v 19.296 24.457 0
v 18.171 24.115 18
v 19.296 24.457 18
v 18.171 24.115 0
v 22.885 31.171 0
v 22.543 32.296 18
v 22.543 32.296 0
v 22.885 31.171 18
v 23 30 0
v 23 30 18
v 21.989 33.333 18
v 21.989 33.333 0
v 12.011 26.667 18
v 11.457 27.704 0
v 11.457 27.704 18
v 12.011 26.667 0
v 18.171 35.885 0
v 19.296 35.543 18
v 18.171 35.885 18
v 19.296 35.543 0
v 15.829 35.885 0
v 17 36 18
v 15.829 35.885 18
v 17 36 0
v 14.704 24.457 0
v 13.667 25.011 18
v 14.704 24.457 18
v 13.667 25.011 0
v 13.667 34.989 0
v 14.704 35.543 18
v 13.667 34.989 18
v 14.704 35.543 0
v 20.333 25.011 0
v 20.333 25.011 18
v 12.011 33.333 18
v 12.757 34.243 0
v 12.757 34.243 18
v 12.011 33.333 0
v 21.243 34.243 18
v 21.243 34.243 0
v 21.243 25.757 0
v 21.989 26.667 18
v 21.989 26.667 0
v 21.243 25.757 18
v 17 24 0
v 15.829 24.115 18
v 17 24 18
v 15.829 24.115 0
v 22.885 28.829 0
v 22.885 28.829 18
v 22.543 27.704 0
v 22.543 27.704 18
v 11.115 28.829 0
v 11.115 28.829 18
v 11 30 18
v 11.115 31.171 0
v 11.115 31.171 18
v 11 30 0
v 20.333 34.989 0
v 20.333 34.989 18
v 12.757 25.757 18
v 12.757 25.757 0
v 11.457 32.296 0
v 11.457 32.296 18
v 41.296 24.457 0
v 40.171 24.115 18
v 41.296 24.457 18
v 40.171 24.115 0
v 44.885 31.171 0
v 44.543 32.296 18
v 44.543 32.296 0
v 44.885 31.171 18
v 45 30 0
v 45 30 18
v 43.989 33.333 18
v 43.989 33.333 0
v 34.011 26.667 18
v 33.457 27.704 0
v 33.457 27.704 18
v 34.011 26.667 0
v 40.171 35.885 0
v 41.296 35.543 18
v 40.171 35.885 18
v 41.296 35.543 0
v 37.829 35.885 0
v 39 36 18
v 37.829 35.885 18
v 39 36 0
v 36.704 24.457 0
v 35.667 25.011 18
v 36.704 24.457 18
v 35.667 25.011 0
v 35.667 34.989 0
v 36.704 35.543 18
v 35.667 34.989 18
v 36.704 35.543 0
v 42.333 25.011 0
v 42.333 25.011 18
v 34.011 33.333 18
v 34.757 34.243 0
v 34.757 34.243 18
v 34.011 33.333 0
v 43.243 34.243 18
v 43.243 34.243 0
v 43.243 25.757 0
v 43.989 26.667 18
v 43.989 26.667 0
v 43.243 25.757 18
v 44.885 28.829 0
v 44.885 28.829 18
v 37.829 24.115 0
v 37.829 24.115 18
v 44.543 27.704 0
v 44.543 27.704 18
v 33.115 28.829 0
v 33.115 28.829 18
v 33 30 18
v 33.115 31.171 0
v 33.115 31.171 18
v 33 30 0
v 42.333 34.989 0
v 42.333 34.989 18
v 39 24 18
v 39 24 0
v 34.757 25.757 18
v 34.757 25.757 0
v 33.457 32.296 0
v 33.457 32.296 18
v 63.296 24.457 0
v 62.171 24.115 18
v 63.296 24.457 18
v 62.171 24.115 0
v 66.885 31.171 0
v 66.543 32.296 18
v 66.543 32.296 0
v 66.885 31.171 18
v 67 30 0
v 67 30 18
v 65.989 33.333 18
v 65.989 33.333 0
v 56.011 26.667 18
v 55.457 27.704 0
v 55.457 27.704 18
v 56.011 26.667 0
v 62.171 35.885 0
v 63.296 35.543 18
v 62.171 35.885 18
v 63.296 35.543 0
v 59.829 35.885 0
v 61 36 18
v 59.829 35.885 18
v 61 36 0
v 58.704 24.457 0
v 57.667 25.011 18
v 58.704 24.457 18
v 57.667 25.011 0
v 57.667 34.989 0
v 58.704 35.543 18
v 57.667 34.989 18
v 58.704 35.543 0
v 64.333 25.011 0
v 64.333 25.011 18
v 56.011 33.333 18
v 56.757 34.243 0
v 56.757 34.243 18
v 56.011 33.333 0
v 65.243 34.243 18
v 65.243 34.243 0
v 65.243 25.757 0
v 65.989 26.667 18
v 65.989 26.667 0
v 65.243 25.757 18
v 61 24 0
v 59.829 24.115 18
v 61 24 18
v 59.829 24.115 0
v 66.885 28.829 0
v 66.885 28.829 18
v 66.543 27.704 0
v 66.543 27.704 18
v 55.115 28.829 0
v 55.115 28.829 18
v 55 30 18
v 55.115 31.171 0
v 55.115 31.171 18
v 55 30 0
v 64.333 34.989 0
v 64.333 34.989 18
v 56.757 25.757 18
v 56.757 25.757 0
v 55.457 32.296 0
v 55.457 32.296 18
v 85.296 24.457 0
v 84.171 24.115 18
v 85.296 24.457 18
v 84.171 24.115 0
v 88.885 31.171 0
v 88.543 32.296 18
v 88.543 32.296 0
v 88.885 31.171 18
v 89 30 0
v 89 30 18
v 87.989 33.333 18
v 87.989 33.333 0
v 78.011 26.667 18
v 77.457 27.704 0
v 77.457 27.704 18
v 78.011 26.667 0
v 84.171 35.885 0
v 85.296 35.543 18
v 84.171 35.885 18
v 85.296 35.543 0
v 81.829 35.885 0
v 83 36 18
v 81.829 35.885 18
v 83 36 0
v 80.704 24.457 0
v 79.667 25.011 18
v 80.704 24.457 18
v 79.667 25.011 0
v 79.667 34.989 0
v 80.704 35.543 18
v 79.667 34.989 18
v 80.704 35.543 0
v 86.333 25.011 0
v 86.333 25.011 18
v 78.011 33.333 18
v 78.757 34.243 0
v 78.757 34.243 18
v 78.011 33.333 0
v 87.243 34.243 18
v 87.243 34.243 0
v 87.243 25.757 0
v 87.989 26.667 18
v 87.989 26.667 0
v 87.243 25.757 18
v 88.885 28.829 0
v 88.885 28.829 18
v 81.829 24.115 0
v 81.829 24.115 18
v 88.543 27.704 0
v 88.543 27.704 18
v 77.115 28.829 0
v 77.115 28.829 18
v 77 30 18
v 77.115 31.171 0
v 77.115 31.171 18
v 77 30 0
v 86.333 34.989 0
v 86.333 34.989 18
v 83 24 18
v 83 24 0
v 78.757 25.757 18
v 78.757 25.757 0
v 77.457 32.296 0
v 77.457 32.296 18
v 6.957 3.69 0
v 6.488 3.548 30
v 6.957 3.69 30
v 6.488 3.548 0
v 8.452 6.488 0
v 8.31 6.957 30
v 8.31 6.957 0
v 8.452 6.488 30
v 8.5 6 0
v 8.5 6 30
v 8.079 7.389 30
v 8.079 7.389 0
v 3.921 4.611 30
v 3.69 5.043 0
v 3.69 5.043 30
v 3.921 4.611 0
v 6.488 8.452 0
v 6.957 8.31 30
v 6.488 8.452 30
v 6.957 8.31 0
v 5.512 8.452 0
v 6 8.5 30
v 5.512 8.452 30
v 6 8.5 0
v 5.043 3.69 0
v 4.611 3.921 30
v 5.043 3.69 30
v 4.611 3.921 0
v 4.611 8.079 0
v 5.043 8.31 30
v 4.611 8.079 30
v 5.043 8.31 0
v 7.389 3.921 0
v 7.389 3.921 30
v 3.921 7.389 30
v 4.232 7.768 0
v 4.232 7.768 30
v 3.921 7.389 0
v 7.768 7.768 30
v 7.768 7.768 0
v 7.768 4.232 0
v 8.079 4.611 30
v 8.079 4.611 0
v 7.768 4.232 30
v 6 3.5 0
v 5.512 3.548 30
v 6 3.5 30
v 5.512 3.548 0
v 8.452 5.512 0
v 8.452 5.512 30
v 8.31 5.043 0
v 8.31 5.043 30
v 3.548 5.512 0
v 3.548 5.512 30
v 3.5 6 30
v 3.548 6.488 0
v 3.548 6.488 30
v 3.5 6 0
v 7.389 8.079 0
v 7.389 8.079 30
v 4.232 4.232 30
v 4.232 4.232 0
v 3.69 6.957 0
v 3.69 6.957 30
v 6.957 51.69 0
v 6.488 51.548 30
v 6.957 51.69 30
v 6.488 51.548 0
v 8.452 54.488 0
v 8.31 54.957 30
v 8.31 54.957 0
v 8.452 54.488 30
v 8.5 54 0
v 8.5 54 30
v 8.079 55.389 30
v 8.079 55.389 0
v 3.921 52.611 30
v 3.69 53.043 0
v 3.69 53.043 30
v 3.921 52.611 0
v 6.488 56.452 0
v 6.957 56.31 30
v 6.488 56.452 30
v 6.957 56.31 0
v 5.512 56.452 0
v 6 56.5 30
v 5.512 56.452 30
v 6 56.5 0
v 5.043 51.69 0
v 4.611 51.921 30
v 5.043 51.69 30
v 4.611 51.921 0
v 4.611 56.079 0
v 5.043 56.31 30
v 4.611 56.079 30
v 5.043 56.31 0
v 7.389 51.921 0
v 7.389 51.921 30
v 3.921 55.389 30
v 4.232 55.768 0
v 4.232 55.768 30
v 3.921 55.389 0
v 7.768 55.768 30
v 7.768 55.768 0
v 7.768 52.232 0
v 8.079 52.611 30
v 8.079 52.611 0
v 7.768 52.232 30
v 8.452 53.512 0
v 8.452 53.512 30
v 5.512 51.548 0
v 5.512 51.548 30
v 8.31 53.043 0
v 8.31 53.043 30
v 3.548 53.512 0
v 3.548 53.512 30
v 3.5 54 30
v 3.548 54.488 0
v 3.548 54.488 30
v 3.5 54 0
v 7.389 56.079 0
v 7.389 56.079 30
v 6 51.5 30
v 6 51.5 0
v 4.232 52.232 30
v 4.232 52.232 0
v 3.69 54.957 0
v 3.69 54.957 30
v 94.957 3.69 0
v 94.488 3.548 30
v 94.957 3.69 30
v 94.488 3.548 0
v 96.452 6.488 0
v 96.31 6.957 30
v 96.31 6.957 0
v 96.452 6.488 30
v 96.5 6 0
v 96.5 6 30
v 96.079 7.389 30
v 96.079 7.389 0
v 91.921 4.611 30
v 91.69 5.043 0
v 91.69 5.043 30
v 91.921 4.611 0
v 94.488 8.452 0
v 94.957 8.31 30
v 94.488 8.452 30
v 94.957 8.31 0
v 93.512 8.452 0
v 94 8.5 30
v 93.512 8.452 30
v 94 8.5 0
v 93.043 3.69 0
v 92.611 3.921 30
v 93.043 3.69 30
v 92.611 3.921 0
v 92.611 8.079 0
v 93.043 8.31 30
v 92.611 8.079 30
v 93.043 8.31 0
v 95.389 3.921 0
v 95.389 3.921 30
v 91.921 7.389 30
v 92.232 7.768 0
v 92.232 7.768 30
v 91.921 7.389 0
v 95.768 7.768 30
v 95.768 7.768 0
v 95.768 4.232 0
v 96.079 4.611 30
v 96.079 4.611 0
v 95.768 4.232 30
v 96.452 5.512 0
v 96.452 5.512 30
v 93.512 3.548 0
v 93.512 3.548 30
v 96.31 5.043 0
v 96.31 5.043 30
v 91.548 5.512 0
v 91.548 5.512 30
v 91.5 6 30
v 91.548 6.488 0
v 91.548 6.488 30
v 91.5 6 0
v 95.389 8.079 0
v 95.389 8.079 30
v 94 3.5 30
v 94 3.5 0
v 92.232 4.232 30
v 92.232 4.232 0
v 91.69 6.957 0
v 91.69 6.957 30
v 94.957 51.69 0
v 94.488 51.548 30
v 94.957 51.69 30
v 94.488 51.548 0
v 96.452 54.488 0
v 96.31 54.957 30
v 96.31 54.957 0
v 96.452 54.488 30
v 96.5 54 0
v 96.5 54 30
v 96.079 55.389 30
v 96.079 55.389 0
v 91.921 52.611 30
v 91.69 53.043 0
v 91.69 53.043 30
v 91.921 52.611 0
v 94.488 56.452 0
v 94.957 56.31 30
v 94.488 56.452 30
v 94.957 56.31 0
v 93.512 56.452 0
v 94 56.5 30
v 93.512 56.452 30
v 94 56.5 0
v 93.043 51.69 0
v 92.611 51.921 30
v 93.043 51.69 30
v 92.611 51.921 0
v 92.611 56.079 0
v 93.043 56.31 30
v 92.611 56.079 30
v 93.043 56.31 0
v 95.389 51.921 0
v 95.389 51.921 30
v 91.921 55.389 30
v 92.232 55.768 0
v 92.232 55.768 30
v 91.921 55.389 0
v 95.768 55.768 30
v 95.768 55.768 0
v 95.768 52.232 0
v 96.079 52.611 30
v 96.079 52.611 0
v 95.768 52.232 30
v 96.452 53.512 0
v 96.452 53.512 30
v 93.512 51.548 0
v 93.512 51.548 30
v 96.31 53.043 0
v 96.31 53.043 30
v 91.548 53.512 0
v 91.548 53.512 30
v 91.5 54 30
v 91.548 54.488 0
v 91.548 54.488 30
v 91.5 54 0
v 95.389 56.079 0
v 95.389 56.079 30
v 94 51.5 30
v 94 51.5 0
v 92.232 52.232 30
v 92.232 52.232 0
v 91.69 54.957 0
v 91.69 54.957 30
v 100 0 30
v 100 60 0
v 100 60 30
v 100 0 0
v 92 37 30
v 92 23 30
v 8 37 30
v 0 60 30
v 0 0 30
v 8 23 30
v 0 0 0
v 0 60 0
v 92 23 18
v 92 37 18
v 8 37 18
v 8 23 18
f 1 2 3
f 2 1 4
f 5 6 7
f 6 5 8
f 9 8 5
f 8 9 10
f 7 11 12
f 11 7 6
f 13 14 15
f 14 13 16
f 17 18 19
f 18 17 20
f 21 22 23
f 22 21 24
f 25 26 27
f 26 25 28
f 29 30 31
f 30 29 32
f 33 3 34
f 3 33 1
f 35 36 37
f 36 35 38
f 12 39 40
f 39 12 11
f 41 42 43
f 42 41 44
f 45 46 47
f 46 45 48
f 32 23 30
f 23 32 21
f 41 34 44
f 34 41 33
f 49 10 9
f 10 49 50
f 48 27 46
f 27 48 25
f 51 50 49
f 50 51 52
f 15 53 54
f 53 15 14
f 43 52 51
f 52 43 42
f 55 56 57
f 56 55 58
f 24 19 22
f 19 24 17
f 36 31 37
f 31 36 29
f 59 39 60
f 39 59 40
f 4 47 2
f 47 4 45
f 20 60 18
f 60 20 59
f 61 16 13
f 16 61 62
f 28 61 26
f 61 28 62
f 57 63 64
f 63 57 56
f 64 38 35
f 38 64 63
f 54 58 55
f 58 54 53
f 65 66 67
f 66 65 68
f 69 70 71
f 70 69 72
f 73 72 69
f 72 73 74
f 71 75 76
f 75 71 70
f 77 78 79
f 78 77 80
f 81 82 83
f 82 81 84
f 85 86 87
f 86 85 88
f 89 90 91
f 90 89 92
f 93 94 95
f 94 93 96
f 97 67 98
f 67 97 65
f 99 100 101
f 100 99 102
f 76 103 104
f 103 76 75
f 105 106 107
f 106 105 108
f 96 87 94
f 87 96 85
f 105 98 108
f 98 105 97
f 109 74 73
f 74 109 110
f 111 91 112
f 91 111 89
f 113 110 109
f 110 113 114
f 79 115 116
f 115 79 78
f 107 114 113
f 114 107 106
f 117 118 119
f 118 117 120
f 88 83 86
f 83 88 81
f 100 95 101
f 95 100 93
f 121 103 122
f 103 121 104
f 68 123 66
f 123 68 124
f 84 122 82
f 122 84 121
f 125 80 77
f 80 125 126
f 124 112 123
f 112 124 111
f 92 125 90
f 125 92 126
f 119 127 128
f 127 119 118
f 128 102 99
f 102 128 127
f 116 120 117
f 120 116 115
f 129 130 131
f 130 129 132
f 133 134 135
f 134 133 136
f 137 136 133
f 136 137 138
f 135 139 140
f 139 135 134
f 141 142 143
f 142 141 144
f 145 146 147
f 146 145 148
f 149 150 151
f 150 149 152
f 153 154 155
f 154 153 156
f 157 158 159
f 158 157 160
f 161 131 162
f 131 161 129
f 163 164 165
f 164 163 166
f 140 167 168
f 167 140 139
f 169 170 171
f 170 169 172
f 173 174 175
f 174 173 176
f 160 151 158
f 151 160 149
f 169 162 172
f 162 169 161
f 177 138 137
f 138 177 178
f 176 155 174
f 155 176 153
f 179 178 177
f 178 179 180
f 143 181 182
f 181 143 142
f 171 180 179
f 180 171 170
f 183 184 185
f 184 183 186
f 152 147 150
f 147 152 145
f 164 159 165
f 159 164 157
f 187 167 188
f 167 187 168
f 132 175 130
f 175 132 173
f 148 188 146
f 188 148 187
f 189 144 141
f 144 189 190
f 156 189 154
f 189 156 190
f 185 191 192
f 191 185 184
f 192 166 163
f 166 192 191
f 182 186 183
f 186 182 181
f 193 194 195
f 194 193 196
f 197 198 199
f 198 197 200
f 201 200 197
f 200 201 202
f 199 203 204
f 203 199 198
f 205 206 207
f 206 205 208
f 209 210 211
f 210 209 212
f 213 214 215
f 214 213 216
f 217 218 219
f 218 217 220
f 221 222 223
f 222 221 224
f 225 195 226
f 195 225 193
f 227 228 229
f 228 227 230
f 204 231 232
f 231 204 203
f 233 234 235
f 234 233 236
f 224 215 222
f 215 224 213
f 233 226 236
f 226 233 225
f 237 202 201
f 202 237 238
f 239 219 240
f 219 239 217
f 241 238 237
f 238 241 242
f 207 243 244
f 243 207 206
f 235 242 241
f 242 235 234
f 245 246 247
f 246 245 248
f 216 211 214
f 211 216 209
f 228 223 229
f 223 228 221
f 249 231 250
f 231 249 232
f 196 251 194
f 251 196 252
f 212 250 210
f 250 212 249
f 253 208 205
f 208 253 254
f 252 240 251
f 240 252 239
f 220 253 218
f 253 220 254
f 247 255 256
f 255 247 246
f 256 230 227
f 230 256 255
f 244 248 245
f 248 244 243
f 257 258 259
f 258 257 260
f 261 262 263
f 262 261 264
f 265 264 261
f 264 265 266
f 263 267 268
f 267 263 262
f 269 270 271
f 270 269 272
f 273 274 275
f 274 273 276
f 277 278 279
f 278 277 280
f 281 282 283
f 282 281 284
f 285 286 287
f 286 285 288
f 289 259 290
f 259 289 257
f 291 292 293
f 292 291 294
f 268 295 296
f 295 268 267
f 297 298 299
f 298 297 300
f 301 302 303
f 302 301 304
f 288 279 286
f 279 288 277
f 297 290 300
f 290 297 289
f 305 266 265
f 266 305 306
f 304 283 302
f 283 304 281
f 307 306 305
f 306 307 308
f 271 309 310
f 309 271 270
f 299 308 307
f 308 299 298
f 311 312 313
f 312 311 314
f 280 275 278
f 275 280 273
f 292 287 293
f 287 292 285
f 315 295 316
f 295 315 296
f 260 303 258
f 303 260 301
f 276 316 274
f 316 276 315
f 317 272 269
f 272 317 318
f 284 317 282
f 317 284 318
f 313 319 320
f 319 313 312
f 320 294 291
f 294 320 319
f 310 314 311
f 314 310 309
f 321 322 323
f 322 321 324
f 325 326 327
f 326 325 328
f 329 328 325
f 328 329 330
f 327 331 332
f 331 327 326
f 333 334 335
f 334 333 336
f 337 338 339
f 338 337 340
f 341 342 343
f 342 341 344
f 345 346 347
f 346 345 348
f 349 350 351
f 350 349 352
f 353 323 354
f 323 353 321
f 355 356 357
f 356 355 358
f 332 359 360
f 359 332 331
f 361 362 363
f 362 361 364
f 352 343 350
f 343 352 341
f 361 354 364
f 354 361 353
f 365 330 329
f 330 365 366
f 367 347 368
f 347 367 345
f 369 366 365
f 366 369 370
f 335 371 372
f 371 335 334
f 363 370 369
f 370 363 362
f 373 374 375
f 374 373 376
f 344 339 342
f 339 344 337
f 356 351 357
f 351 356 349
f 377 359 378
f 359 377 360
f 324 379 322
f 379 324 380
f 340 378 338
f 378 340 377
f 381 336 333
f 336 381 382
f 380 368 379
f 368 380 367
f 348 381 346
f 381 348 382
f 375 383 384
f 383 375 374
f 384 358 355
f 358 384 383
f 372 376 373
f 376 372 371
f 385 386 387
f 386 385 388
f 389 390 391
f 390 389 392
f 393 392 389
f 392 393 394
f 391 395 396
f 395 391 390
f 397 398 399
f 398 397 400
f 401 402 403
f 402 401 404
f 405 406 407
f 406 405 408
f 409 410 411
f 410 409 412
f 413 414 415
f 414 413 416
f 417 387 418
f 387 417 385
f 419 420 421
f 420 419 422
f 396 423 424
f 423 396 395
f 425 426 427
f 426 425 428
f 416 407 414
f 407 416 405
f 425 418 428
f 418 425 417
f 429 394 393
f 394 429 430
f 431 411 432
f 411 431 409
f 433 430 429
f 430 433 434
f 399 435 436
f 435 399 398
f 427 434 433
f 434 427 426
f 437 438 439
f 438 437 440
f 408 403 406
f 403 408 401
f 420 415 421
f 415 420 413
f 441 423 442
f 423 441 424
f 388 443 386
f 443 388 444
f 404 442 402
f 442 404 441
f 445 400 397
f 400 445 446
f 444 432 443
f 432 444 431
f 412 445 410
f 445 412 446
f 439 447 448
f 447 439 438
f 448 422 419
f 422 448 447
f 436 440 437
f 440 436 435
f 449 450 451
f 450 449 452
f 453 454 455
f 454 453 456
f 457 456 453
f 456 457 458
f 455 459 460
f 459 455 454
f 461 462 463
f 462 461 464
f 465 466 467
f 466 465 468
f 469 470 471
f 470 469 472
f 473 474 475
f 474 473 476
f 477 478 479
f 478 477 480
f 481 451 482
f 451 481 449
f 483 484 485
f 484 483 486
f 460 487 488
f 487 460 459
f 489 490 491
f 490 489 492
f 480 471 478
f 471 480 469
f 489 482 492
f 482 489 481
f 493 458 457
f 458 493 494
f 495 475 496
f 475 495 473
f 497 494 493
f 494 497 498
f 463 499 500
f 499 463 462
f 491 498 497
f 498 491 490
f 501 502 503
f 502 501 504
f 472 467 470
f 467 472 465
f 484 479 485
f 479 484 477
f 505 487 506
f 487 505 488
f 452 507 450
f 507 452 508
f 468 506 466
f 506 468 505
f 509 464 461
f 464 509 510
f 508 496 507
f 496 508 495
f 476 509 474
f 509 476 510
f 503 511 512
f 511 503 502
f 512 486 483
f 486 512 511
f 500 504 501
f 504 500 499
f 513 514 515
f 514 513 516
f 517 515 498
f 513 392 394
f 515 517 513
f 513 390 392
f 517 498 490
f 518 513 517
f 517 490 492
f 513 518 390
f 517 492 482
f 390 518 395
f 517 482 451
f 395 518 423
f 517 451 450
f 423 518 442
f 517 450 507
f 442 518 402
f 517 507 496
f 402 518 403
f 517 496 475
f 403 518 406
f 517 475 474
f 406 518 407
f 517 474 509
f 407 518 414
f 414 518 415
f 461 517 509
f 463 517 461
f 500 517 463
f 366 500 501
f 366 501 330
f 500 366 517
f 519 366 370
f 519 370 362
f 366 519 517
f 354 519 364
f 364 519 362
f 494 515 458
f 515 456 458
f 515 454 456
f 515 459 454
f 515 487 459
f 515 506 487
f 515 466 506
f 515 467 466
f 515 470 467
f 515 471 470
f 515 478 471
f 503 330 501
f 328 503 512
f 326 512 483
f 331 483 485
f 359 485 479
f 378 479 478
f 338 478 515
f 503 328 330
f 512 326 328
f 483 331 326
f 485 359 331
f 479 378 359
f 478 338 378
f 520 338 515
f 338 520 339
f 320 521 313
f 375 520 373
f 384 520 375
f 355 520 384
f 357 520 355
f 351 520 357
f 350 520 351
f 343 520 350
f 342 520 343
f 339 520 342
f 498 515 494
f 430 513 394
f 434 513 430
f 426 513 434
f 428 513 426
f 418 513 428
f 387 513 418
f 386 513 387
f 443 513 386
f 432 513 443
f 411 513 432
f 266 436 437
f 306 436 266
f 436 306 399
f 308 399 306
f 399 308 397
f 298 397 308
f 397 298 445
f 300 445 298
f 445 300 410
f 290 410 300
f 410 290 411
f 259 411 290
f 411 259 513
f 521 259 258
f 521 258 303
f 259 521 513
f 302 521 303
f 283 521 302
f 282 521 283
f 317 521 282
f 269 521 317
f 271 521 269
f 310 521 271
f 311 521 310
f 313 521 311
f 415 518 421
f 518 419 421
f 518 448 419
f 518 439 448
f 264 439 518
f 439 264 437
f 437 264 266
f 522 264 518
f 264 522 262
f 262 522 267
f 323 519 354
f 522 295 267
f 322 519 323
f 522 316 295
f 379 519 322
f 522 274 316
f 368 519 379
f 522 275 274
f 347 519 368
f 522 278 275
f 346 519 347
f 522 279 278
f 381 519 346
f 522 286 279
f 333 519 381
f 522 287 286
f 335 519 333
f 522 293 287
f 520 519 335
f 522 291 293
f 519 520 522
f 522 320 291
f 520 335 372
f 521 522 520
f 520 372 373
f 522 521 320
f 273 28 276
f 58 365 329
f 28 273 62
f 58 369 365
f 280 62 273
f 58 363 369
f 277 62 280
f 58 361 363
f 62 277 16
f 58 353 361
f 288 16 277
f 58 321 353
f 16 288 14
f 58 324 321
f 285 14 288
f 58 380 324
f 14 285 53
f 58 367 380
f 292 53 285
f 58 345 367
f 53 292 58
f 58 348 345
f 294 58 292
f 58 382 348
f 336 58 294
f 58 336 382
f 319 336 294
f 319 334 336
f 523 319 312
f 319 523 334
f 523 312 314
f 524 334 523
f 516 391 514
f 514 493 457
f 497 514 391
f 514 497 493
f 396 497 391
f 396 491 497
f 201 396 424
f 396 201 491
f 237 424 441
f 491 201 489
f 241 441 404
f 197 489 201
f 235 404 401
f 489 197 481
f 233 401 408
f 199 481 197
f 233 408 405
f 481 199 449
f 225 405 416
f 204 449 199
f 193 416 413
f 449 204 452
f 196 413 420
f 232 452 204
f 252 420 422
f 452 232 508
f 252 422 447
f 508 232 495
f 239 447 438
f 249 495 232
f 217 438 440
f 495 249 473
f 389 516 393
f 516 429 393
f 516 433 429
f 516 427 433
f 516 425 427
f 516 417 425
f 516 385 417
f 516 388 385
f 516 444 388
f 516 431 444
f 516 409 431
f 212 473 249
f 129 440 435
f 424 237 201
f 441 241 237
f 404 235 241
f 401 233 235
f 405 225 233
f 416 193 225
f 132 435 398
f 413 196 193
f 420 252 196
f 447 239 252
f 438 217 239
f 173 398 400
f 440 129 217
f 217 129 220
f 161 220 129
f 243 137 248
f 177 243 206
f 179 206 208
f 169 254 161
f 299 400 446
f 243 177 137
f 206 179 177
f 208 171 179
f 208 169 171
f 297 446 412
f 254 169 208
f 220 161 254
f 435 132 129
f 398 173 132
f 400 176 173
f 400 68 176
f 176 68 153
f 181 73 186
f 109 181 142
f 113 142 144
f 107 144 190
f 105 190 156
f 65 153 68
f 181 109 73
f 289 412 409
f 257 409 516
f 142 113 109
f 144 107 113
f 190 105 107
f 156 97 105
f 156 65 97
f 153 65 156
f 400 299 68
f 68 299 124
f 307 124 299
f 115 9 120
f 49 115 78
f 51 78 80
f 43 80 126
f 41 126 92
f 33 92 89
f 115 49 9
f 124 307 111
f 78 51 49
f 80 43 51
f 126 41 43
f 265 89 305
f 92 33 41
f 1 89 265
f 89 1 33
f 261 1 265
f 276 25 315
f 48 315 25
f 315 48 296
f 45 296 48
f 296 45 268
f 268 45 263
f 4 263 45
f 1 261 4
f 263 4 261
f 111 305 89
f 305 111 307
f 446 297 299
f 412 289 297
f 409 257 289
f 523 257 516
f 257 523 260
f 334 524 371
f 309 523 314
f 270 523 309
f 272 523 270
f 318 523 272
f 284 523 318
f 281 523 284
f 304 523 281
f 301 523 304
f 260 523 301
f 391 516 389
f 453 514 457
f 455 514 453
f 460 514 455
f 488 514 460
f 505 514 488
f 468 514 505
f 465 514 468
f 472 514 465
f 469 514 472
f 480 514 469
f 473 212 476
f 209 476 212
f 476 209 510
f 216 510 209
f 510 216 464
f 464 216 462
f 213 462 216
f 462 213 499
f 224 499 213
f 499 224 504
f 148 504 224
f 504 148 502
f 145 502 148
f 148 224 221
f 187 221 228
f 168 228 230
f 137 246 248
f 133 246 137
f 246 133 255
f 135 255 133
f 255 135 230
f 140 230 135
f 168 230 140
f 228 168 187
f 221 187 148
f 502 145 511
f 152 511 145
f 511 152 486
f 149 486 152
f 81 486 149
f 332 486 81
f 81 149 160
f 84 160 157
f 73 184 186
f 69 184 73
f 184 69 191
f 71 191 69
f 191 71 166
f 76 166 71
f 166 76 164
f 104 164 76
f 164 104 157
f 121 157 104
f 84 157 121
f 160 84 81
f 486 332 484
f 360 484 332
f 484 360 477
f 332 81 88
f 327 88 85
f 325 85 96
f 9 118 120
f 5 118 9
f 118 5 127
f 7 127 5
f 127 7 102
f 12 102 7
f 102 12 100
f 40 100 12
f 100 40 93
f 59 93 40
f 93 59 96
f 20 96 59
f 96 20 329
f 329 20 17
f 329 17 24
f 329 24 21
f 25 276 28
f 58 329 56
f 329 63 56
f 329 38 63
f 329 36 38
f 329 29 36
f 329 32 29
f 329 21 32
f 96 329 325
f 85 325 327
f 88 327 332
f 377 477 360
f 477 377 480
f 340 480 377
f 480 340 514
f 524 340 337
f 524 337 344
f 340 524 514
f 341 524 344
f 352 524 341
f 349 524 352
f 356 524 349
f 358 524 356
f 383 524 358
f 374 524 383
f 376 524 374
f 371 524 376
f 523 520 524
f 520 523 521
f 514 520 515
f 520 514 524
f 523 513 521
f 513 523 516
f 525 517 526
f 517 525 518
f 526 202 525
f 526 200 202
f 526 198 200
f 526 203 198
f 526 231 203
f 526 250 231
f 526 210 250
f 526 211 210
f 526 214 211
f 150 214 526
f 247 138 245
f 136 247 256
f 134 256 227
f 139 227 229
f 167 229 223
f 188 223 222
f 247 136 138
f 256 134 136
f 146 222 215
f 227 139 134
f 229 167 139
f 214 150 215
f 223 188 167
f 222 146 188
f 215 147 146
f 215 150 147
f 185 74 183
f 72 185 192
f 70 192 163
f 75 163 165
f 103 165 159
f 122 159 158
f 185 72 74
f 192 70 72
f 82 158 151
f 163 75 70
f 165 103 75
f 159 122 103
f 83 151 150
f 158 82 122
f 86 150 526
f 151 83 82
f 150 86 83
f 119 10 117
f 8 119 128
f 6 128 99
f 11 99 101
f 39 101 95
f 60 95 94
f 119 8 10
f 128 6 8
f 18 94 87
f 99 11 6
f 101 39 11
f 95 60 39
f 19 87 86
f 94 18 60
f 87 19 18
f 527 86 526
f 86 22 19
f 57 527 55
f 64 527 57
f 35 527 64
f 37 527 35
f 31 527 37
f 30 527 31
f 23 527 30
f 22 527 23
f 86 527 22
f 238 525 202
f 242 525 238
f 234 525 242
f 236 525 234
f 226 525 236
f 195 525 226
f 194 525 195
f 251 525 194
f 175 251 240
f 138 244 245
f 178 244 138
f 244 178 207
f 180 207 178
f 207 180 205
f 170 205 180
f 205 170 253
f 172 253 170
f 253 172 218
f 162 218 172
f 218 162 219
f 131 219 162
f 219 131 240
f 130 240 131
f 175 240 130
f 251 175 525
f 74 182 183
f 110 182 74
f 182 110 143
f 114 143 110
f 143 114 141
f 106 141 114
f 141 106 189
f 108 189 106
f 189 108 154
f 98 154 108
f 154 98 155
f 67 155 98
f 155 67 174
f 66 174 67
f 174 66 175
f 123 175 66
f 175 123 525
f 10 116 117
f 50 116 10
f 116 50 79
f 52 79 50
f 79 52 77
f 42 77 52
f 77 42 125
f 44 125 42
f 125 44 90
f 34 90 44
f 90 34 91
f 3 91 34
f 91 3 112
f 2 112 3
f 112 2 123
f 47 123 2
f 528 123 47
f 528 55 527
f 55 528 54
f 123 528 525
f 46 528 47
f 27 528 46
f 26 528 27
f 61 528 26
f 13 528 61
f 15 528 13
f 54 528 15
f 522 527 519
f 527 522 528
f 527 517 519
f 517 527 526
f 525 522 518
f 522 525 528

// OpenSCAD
$fn = 32;

// ----------------------------------------------------------------------
// Manifold block: gallery_top manifold
// ----------------------------------------------------------------------

// --- parameters (mm) ---
block_l = 100;            // block length, X
block_w = 60;             // block width, Y
block_h = 30;             // block height, Z
port_d = 12;              // port bore diameter
port_pitch = 22;          // port pitch along X
gallery_d = 14;           // top gallery width, Y
gallery_depth = 12;       // gallery pocket depth
wall_p = 8;               // gallery end wall thickness, X
mnt_d = 5;                // mounting hole diameter
mnt_in = 6;               // mounting hole inset from the edges

n_ports = 4;  // ports in the row
port_x0 = (block_l - (n_ports - 1) * port_pitch) / 2;  // first port X

difference() {
  cube([block_l, block_w, block_h]);
  for (i = [0 : n_ports - 1])
    translate([port_x0 + i * port_pitch, block_w / 2, -1])
      cylinder(h = block_h + 2, d = port_d);
  translate([wall_p, block_w / 2 - gallery_d / 2, block_h - gallery_depth])
    cube([block_l - 2 * wall_p, gallery_d, gallery_depth + 1]);
  for (cx = [mnt_in, block_l - mnt_in])
    for (cy = [mnt_in, block_w - mnt_in])
      translate([cx, cy, -1]) cylinder(h = block_h + 2, d = mnt_d);
}
